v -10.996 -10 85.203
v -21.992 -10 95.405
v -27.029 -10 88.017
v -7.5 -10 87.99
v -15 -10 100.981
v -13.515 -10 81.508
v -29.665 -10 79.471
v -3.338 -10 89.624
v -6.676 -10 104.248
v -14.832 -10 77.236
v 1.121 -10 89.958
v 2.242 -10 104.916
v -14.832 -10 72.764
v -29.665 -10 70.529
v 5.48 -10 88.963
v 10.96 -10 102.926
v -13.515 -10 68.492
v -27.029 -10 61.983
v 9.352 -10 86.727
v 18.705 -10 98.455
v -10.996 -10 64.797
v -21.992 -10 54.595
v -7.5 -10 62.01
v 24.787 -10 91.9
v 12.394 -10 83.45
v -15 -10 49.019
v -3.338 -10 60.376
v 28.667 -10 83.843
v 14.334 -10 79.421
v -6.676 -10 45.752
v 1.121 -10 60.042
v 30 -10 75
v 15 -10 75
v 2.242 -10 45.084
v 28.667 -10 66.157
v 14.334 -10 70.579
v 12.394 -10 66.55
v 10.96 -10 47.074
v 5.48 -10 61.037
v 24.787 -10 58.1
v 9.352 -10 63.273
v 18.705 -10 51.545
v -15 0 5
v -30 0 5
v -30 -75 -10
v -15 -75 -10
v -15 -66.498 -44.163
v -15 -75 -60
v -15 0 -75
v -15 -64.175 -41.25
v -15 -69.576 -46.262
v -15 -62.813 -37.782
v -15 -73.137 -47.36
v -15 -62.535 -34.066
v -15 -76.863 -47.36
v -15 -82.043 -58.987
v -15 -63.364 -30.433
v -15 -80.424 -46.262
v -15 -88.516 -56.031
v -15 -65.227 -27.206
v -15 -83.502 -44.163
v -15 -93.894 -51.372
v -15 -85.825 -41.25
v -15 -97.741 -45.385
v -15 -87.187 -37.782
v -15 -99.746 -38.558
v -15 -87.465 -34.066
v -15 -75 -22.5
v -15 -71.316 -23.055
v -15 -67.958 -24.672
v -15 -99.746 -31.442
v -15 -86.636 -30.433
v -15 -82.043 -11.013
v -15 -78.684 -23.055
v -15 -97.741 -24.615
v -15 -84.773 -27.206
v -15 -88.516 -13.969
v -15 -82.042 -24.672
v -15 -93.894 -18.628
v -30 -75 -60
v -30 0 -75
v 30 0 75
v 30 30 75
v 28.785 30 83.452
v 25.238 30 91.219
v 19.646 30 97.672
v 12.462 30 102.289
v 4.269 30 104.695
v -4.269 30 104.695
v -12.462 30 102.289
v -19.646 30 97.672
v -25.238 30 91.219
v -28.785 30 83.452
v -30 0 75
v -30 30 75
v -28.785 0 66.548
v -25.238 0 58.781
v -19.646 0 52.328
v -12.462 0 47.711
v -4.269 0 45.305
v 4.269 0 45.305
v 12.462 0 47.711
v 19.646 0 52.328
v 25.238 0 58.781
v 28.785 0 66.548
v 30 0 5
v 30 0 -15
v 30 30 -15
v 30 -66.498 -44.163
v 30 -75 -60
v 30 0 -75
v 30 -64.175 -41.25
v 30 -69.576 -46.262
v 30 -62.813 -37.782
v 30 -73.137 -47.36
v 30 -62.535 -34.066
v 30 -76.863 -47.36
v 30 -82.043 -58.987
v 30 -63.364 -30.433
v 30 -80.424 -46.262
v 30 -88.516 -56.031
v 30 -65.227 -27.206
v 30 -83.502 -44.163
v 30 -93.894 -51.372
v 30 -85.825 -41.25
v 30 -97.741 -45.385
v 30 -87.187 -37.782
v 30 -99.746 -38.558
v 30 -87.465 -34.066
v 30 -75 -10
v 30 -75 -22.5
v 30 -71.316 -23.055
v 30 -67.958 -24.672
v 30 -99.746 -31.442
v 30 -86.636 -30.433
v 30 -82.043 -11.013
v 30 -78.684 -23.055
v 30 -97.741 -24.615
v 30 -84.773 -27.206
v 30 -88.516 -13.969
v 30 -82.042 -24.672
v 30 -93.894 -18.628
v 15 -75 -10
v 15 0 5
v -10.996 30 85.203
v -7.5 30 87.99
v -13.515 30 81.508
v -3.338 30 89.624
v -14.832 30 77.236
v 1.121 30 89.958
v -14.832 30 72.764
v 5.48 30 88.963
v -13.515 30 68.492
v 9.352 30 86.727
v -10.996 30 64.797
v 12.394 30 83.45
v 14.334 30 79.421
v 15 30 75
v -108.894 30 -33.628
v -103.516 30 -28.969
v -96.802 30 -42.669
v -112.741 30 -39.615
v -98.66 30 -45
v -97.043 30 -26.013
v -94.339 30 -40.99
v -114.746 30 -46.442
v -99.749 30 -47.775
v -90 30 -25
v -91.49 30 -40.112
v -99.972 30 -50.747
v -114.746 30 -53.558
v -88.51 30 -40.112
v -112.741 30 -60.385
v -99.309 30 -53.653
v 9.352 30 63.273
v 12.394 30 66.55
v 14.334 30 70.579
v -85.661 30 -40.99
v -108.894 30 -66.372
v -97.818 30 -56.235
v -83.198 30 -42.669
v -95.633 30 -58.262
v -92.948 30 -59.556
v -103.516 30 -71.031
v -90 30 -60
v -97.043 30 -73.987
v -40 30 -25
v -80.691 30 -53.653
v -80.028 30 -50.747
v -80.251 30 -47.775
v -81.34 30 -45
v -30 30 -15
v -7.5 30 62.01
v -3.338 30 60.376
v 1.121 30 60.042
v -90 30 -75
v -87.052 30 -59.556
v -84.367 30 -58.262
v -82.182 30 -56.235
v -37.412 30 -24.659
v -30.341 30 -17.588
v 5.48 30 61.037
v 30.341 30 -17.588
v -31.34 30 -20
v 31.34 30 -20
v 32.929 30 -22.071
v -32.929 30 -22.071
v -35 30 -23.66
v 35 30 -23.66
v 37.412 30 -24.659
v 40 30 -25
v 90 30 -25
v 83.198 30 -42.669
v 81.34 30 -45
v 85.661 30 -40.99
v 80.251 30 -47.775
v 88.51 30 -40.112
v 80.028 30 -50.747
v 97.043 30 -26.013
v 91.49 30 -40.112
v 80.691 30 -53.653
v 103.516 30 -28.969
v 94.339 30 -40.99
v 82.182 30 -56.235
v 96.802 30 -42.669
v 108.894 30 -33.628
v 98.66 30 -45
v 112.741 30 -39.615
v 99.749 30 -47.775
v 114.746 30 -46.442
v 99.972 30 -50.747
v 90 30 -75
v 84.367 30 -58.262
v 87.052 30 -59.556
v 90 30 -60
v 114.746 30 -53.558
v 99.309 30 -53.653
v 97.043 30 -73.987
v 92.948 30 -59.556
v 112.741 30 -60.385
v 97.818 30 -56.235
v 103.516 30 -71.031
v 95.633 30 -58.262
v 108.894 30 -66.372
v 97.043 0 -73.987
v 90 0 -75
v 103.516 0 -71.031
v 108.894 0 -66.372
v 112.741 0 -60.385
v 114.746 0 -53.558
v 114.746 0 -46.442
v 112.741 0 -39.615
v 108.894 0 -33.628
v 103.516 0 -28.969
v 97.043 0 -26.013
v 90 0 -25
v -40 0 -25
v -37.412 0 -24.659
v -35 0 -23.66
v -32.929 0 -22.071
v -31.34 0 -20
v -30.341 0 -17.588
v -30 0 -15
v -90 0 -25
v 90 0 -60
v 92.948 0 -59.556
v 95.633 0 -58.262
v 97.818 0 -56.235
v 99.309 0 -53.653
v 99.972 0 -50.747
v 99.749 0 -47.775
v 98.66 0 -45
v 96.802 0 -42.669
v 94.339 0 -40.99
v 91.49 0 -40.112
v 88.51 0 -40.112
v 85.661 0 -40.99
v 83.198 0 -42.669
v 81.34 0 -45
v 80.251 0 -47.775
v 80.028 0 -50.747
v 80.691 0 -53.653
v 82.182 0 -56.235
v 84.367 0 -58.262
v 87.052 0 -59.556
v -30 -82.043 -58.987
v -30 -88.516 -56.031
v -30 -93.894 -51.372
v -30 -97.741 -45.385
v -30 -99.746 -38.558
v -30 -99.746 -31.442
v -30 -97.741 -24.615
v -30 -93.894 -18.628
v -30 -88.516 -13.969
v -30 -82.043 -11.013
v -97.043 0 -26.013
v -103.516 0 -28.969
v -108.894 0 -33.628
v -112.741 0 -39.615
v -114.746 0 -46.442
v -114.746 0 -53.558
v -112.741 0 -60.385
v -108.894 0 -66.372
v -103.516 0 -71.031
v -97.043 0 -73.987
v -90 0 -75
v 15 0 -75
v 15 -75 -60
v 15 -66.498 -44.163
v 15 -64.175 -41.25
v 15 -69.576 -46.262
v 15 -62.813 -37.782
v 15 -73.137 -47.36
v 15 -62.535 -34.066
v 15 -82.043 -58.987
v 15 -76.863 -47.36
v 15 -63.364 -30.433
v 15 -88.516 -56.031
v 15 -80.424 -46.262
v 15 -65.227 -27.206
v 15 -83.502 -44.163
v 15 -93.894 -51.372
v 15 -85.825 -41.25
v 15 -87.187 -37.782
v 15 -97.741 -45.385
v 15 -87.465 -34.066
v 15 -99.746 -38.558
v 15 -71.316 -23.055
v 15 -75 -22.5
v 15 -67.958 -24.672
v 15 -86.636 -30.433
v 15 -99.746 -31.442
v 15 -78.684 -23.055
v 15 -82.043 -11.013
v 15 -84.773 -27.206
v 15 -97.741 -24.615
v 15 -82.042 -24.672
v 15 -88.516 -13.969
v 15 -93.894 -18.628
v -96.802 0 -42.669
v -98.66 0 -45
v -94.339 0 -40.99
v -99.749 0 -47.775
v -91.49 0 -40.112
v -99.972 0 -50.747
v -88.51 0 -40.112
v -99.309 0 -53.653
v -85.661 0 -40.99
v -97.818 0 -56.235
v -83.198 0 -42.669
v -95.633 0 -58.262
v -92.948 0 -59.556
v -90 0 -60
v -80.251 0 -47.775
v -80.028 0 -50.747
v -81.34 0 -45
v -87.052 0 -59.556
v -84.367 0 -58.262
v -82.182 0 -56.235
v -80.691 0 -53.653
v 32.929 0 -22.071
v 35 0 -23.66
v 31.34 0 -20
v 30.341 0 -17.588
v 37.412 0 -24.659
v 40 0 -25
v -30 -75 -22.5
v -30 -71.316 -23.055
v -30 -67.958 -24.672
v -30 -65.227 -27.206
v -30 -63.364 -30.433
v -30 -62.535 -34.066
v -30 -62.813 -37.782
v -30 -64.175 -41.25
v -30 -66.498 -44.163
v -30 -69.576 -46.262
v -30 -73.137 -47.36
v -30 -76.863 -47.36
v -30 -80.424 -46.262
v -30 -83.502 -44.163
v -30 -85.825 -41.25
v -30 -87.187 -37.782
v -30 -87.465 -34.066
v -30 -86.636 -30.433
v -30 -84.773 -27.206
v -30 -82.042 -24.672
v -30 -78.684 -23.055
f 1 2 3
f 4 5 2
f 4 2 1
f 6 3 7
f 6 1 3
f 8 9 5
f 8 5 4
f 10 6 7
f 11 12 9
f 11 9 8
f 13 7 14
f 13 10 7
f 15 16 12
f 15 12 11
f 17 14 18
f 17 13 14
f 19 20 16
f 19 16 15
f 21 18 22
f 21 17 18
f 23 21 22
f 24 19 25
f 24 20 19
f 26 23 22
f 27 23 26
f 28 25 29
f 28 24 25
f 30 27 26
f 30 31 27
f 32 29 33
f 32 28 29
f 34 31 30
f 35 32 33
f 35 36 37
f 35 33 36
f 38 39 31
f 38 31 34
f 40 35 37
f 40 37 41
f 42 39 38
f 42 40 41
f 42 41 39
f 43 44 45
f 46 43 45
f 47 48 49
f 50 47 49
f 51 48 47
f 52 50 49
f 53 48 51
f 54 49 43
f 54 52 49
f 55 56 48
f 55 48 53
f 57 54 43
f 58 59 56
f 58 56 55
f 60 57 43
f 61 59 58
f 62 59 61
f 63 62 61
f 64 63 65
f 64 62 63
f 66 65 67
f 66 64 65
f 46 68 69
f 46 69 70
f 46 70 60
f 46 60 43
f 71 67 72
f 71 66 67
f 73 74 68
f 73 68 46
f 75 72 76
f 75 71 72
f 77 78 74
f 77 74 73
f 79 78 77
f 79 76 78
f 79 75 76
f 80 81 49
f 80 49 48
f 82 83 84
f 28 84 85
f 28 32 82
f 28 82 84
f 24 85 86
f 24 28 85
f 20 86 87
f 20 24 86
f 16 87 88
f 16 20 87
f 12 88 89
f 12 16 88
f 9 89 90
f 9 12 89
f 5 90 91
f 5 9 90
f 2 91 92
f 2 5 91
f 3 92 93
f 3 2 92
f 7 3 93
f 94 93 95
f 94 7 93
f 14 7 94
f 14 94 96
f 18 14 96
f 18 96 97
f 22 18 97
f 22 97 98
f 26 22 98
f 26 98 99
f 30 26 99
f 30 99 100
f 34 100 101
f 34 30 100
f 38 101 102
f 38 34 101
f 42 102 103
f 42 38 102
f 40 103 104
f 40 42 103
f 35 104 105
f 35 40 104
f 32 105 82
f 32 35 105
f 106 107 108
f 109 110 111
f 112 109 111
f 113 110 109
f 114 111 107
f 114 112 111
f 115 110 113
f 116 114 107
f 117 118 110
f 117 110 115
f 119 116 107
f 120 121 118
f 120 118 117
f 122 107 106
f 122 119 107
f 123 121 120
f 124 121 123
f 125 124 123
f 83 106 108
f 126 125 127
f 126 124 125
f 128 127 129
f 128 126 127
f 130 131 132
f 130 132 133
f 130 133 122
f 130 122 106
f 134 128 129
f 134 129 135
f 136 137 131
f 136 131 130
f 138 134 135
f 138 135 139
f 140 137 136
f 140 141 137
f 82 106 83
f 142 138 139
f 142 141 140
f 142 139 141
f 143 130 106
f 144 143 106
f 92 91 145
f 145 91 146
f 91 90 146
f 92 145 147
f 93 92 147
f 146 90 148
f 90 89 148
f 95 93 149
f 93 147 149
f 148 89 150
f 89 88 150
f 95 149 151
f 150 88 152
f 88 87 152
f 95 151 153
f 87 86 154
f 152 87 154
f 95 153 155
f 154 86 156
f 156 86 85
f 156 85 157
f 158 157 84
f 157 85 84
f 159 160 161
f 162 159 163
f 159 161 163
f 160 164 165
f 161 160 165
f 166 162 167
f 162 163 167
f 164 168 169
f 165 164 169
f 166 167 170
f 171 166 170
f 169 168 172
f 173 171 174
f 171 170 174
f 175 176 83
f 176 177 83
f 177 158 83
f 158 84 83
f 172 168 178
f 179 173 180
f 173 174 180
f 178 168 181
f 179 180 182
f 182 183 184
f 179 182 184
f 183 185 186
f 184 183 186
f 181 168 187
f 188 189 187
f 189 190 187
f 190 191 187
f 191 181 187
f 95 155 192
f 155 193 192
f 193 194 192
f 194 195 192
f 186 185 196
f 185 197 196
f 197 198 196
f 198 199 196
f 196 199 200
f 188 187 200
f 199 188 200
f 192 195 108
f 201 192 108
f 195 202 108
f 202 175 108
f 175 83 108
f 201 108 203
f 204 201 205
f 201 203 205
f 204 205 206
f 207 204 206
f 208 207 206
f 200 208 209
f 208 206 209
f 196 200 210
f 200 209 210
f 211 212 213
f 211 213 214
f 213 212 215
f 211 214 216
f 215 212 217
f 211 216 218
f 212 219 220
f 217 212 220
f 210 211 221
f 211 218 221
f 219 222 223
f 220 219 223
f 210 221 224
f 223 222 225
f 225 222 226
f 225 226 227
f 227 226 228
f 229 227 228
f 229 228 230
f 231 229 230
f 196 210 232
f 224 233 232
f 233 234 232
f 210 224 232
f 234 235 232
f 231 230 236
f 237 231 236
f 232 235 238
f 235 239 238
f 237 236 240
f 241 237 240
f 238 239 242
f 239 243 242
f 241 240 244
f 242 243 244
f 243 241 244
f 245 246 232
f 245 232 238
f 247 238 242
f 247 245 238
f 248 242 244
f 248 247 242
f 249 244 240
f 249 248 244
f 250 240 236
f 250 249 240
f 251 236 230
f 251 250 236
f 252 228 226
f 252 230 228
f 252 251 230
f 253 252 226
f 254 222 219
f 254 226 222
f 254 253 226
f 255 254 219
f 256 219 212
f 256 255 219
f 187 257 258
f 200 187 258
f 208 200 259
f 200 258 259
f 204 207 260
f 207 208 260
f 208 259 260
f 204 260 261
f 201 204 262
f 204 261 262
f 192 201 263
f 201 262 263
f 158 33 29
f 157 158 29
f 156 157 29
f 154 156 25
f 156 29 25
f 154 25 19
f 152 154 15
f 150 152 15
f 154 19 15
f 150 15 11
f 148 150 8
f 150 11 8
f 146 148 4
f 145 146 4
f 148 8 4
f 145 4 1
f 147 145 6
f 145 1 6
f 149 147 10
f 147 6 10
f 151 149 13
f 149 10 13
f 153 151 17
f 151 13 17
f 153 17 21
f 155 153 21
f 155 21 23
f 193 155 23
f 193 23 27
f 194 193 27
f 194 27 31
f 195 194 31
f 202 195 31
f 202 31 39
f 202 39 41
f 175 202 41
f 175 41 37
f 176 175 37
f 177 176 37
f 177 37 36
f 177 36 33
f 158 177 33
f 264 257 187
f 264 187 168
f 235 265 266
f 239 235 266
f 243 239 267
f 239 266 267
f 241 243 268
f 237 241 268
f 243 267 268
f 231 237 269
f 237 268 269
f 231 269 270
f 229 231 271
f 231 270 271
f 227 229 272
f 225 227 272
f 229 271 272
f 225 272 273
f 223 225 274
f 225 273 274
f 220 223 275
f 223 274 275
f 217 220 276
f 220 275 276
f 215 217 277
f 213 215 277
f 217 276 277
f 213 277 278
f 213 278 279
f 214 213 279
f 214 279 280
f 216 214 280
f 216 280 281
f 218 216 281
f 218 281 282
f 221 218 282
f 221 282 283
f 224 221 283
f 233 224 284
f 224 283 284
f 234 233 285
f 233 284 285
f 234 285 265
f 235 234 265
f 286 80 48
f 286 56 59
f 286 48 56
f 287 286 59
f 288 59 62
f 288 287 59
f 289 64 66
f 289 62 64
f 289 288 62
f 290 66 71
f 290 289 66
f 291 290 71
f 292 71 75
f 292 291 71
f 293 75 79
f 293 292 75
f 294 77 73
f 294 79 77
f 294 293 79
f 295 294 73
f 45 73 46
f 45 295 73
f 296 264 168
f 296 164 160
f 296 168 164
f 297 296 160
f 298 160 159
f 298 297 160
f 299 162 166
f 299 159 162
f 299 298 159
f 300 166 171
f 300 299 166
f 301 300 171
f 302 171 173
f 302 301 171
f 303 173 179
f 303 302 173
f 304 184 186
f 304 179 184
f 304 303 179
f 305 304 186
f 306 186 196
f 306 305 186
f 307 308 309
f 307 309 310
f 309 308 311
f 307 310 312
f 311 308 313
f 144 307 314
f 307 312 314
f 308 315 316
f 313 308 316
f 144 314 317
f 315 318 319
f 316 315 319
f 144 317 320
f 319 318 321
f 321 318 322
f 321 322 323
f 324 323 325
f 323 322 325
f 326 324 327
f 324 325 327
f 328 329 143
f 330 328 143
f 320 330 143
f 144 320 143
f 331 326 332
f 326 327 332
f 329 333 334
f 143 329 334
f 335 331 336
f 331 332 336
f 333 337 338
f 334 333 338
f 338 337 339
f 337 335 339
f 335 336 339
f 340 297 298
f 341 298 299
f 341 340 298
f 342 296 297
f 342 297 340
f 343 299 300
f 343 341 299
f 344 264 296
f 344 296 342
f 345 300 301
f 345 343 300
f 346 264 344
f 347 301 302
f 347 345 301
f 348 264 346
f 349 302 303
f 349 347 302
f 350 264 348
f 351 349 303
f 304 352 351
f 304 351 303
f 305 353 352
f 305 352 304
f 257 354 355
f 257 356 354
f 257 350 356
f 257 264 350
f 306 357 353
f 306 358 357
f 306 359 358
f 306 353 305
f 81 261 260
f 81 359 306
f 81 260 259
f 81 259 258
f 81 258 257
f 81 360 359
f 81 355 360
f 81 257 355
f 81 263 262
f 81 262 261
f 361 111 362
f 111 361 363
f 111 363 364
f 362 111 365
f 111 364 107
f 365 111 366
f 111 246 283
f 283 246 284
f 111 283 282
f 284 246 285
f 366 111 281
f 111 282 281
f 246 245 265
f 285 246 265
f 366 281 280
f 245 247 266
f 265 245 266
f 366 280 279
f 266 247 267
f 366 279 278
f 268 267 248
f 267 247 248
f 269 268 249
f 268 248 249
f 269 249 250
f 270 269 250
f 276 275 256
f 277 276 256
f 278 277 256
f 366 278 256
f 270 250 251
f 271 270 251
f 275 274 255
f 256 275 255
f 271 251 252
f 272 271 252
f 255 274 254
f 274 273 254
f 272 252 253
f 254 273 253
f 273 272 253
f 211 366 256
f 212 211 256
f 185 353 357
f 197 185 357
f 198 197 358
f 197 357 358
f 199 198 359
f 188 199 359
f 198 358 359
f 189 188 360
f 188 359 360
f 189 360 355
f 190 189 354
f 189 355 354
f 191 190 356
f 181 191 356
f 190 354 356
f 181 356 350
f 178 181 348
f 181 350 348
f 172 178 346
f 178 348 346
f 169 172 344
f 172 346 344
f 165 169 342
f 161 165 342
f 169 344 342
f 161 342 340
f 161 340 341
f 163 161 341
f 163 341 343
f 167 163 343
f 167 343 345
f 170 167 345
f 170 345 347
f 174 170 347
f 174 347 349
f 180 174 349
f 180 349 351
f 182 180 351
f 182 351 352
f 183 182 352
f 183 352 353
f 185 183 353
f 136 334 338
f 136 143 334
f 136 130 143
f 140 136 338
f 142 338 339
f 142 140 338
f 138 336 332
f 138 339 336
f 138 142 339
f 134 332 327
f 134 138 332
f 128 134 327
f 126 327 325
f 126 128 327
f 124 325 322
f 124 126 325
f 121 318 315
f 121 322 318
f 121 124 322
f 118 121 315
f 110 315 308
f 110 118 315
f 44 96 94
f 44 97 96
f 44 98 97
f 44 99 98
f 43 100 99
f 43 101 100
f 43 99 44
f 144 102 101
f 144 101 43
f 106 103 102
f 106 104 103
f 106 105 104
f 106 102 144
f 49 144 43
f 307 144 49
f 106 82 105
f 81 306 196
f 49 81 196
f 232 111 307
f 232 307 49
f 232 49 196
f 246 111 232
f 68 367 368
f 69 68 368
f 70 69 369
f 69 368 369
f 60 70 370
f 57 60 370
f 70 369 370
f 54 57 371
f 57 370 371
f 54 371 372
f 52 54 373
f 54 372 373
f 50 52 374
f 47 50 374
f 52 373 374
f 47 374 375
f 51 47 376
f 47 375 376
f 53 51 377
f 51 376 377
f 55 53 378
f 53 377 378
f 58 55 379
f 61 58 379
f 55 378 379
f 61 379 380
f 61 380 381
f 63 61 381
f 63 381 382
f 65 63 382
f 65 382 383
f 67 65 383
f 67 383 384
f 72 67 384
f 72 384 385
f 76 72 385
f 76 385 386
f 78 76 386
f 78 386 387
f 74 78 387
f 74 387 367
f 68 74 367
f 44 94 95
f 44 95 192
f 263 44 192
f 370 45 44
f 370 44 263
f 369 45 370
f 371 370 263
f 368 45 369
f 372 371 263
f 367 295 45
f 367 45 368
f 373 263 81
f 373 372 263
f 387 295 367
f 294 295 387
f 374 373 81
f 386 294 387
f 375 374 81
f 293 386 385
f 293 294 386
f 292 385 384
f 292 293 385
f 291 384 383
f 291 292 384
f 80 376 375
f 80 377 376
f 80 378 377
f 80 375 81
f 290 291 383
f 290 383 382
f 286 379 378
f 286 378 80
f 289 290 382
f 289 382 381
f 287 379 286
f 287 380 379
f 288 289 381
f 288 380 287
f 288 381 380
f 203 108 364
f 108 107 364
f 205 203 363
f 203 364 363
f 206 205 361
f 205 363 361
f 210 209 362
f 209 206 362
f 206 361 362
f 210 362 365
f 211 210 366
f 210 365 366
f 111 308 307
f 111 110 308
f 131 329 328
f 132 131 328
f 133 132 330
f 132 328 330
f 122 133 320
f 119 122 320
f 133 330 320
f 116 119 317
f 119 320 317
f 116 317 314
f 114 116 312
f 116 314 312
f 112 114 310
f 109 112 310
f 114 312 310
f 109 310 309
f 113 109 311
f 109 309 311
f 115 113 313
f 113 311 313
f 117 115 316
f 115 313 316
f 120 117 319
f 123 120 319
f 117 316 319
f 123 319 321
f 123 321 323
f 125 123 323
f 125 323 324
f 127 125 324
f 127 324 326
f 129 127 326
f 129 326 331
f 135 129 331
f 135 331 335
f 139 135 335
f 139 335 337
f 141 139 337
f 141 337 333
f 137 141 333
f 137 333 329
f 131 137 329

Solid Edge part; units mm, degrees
sketch "Sketch1" plane through (0, 0, 0) normal (0, -1, 0) x (1, 0, 0)
  line L0 (30, -75) -> (30, 75)
  line L1 (-30, 75) -> (-30, -75)
  line L2 (-30, -75) -> (30, -75)
  arc A0 (-30, 75) -> (30, 75) centre (0, 75) cw
extrude "Protrusion1" add sketch "Sketch1" against normal blind 30
sketch "Sketch2" plane through (0, 0, 15) normal (0, -1, 0) x (1, 0, 0)
  circle A0 centre (0, 60) radius 30
extrude "ExtrudedProtrusion_2" add sketch "Sketch2" along normal blind 10
sketch "Sketch3" plane through (0, -10, 75) normal (0, -1, 0) x (1, 0, 0)
  circle A0 centre (0, 0) radius 15
extrude "ExtrudedCutout_1" cut sketch "Sketch3" against normal blind 40
sketch "Sketch4" plane through (-30, 15, 0) normal (-1, 0, 0) x (0, 0, 1)
  line L0 (5, -15) -> (-10, -90)
  line L1 (-75, -15) -> (-60, -90)
  line L2 (5, -15) -> (-75, -15)
  arc A0 (-10, -90) -> (-60, -90) centre (-35, -90) cw
extrude "ExtrudedProtrusion_3" add sketch "Sketch4" against normal blind 15
sketch "Sketch5" plane through (-30, 15, 0) normal (-1, 0, 0) x (0, 0, 1)
  circle A0 centre (-35, -90) radius 12.5
extrude "ExtrudedCutout_2" cut sketch "Sketch5" against normal blind 15
sketch "Sketch6" plane through (30, 15, 0) normal (1, 0, 0) x (0, 0, -1)
  line L0 (60, -90) -> (75, -15)
  line L1 (-5, -15) -> (75, -15)
  line L2 (10, -90) -> (-5, -15)
  arc A0 (60, -90) -> (10, -90) centre (35, -90) cw
extrude "ExtrudedProtrusion_4" add sketch "Sketch6" against normal blind 15
sketch "Sketch7" plane through (-30, 15, 0) normal (-1, 0, 0) x (0, 0, 1)
  circle A0 centre (-35, -90) radius 12.5
extrude "Cutout1" cut sketch "Sketch7" against normal up to vertex (60 mm away)
sketch "Sketch8" plane through (0, 0, 0) normal (0, -1, 0) x (0, 0, -1)
  line L0 (25, 40) -> (25, 90)
  line L1 (75, 90) -> (75, 30)
  line L2 (75, 30) -> (25, 30)
  line L3 (25, 30) -> (15, 30)
  arc A0 (25, 90) -> (75, 90) centre (50, 90) cw
  arc A1 (25, 40) -> (15, 30) centre (15, 40) cw
extrude "ExtrudedProtrusion_5" add sketch "Sketch8" against normal blind 30
sketch "Sketch9" plane through (0, 0, 0) normal (0, -1, 0) x (0, 0, -1)
  circle A0 centre (50, 90) radius 10
extrude "ExtrudedCutout_4" cut sketch "Sketch9" against normal blind 30
sketch "Sketch10" plane through (0, 0, 0) normal (0, -1, 0) x (0, 0, -1)
  line L0 (25, -40) -> (25, -90)
  line L1 (75, -90) -> (75, -30)
  line L2 (75, -30) -> (25, -30)
  line L3 (25, -30) -> (15, -30)
  arc A0 (75, -90) -> (25, -90) centre (50, -90) cw
  arc A1 (15, -30) -> (25, -40) centre (15, -40) cw
extrude "ExtrudedProtrusion_6" add sketch "Sketch10" against normal blind 30
sketch "Sketch11" plane through (0, 0, 0) normal (0, -1, 0) x (0, 0, -1)
  circle A0 centre (50, -90) radius 10
extrude "ExtrudedCutout_5" cut sketch "Sketch11" against normal blind 30
